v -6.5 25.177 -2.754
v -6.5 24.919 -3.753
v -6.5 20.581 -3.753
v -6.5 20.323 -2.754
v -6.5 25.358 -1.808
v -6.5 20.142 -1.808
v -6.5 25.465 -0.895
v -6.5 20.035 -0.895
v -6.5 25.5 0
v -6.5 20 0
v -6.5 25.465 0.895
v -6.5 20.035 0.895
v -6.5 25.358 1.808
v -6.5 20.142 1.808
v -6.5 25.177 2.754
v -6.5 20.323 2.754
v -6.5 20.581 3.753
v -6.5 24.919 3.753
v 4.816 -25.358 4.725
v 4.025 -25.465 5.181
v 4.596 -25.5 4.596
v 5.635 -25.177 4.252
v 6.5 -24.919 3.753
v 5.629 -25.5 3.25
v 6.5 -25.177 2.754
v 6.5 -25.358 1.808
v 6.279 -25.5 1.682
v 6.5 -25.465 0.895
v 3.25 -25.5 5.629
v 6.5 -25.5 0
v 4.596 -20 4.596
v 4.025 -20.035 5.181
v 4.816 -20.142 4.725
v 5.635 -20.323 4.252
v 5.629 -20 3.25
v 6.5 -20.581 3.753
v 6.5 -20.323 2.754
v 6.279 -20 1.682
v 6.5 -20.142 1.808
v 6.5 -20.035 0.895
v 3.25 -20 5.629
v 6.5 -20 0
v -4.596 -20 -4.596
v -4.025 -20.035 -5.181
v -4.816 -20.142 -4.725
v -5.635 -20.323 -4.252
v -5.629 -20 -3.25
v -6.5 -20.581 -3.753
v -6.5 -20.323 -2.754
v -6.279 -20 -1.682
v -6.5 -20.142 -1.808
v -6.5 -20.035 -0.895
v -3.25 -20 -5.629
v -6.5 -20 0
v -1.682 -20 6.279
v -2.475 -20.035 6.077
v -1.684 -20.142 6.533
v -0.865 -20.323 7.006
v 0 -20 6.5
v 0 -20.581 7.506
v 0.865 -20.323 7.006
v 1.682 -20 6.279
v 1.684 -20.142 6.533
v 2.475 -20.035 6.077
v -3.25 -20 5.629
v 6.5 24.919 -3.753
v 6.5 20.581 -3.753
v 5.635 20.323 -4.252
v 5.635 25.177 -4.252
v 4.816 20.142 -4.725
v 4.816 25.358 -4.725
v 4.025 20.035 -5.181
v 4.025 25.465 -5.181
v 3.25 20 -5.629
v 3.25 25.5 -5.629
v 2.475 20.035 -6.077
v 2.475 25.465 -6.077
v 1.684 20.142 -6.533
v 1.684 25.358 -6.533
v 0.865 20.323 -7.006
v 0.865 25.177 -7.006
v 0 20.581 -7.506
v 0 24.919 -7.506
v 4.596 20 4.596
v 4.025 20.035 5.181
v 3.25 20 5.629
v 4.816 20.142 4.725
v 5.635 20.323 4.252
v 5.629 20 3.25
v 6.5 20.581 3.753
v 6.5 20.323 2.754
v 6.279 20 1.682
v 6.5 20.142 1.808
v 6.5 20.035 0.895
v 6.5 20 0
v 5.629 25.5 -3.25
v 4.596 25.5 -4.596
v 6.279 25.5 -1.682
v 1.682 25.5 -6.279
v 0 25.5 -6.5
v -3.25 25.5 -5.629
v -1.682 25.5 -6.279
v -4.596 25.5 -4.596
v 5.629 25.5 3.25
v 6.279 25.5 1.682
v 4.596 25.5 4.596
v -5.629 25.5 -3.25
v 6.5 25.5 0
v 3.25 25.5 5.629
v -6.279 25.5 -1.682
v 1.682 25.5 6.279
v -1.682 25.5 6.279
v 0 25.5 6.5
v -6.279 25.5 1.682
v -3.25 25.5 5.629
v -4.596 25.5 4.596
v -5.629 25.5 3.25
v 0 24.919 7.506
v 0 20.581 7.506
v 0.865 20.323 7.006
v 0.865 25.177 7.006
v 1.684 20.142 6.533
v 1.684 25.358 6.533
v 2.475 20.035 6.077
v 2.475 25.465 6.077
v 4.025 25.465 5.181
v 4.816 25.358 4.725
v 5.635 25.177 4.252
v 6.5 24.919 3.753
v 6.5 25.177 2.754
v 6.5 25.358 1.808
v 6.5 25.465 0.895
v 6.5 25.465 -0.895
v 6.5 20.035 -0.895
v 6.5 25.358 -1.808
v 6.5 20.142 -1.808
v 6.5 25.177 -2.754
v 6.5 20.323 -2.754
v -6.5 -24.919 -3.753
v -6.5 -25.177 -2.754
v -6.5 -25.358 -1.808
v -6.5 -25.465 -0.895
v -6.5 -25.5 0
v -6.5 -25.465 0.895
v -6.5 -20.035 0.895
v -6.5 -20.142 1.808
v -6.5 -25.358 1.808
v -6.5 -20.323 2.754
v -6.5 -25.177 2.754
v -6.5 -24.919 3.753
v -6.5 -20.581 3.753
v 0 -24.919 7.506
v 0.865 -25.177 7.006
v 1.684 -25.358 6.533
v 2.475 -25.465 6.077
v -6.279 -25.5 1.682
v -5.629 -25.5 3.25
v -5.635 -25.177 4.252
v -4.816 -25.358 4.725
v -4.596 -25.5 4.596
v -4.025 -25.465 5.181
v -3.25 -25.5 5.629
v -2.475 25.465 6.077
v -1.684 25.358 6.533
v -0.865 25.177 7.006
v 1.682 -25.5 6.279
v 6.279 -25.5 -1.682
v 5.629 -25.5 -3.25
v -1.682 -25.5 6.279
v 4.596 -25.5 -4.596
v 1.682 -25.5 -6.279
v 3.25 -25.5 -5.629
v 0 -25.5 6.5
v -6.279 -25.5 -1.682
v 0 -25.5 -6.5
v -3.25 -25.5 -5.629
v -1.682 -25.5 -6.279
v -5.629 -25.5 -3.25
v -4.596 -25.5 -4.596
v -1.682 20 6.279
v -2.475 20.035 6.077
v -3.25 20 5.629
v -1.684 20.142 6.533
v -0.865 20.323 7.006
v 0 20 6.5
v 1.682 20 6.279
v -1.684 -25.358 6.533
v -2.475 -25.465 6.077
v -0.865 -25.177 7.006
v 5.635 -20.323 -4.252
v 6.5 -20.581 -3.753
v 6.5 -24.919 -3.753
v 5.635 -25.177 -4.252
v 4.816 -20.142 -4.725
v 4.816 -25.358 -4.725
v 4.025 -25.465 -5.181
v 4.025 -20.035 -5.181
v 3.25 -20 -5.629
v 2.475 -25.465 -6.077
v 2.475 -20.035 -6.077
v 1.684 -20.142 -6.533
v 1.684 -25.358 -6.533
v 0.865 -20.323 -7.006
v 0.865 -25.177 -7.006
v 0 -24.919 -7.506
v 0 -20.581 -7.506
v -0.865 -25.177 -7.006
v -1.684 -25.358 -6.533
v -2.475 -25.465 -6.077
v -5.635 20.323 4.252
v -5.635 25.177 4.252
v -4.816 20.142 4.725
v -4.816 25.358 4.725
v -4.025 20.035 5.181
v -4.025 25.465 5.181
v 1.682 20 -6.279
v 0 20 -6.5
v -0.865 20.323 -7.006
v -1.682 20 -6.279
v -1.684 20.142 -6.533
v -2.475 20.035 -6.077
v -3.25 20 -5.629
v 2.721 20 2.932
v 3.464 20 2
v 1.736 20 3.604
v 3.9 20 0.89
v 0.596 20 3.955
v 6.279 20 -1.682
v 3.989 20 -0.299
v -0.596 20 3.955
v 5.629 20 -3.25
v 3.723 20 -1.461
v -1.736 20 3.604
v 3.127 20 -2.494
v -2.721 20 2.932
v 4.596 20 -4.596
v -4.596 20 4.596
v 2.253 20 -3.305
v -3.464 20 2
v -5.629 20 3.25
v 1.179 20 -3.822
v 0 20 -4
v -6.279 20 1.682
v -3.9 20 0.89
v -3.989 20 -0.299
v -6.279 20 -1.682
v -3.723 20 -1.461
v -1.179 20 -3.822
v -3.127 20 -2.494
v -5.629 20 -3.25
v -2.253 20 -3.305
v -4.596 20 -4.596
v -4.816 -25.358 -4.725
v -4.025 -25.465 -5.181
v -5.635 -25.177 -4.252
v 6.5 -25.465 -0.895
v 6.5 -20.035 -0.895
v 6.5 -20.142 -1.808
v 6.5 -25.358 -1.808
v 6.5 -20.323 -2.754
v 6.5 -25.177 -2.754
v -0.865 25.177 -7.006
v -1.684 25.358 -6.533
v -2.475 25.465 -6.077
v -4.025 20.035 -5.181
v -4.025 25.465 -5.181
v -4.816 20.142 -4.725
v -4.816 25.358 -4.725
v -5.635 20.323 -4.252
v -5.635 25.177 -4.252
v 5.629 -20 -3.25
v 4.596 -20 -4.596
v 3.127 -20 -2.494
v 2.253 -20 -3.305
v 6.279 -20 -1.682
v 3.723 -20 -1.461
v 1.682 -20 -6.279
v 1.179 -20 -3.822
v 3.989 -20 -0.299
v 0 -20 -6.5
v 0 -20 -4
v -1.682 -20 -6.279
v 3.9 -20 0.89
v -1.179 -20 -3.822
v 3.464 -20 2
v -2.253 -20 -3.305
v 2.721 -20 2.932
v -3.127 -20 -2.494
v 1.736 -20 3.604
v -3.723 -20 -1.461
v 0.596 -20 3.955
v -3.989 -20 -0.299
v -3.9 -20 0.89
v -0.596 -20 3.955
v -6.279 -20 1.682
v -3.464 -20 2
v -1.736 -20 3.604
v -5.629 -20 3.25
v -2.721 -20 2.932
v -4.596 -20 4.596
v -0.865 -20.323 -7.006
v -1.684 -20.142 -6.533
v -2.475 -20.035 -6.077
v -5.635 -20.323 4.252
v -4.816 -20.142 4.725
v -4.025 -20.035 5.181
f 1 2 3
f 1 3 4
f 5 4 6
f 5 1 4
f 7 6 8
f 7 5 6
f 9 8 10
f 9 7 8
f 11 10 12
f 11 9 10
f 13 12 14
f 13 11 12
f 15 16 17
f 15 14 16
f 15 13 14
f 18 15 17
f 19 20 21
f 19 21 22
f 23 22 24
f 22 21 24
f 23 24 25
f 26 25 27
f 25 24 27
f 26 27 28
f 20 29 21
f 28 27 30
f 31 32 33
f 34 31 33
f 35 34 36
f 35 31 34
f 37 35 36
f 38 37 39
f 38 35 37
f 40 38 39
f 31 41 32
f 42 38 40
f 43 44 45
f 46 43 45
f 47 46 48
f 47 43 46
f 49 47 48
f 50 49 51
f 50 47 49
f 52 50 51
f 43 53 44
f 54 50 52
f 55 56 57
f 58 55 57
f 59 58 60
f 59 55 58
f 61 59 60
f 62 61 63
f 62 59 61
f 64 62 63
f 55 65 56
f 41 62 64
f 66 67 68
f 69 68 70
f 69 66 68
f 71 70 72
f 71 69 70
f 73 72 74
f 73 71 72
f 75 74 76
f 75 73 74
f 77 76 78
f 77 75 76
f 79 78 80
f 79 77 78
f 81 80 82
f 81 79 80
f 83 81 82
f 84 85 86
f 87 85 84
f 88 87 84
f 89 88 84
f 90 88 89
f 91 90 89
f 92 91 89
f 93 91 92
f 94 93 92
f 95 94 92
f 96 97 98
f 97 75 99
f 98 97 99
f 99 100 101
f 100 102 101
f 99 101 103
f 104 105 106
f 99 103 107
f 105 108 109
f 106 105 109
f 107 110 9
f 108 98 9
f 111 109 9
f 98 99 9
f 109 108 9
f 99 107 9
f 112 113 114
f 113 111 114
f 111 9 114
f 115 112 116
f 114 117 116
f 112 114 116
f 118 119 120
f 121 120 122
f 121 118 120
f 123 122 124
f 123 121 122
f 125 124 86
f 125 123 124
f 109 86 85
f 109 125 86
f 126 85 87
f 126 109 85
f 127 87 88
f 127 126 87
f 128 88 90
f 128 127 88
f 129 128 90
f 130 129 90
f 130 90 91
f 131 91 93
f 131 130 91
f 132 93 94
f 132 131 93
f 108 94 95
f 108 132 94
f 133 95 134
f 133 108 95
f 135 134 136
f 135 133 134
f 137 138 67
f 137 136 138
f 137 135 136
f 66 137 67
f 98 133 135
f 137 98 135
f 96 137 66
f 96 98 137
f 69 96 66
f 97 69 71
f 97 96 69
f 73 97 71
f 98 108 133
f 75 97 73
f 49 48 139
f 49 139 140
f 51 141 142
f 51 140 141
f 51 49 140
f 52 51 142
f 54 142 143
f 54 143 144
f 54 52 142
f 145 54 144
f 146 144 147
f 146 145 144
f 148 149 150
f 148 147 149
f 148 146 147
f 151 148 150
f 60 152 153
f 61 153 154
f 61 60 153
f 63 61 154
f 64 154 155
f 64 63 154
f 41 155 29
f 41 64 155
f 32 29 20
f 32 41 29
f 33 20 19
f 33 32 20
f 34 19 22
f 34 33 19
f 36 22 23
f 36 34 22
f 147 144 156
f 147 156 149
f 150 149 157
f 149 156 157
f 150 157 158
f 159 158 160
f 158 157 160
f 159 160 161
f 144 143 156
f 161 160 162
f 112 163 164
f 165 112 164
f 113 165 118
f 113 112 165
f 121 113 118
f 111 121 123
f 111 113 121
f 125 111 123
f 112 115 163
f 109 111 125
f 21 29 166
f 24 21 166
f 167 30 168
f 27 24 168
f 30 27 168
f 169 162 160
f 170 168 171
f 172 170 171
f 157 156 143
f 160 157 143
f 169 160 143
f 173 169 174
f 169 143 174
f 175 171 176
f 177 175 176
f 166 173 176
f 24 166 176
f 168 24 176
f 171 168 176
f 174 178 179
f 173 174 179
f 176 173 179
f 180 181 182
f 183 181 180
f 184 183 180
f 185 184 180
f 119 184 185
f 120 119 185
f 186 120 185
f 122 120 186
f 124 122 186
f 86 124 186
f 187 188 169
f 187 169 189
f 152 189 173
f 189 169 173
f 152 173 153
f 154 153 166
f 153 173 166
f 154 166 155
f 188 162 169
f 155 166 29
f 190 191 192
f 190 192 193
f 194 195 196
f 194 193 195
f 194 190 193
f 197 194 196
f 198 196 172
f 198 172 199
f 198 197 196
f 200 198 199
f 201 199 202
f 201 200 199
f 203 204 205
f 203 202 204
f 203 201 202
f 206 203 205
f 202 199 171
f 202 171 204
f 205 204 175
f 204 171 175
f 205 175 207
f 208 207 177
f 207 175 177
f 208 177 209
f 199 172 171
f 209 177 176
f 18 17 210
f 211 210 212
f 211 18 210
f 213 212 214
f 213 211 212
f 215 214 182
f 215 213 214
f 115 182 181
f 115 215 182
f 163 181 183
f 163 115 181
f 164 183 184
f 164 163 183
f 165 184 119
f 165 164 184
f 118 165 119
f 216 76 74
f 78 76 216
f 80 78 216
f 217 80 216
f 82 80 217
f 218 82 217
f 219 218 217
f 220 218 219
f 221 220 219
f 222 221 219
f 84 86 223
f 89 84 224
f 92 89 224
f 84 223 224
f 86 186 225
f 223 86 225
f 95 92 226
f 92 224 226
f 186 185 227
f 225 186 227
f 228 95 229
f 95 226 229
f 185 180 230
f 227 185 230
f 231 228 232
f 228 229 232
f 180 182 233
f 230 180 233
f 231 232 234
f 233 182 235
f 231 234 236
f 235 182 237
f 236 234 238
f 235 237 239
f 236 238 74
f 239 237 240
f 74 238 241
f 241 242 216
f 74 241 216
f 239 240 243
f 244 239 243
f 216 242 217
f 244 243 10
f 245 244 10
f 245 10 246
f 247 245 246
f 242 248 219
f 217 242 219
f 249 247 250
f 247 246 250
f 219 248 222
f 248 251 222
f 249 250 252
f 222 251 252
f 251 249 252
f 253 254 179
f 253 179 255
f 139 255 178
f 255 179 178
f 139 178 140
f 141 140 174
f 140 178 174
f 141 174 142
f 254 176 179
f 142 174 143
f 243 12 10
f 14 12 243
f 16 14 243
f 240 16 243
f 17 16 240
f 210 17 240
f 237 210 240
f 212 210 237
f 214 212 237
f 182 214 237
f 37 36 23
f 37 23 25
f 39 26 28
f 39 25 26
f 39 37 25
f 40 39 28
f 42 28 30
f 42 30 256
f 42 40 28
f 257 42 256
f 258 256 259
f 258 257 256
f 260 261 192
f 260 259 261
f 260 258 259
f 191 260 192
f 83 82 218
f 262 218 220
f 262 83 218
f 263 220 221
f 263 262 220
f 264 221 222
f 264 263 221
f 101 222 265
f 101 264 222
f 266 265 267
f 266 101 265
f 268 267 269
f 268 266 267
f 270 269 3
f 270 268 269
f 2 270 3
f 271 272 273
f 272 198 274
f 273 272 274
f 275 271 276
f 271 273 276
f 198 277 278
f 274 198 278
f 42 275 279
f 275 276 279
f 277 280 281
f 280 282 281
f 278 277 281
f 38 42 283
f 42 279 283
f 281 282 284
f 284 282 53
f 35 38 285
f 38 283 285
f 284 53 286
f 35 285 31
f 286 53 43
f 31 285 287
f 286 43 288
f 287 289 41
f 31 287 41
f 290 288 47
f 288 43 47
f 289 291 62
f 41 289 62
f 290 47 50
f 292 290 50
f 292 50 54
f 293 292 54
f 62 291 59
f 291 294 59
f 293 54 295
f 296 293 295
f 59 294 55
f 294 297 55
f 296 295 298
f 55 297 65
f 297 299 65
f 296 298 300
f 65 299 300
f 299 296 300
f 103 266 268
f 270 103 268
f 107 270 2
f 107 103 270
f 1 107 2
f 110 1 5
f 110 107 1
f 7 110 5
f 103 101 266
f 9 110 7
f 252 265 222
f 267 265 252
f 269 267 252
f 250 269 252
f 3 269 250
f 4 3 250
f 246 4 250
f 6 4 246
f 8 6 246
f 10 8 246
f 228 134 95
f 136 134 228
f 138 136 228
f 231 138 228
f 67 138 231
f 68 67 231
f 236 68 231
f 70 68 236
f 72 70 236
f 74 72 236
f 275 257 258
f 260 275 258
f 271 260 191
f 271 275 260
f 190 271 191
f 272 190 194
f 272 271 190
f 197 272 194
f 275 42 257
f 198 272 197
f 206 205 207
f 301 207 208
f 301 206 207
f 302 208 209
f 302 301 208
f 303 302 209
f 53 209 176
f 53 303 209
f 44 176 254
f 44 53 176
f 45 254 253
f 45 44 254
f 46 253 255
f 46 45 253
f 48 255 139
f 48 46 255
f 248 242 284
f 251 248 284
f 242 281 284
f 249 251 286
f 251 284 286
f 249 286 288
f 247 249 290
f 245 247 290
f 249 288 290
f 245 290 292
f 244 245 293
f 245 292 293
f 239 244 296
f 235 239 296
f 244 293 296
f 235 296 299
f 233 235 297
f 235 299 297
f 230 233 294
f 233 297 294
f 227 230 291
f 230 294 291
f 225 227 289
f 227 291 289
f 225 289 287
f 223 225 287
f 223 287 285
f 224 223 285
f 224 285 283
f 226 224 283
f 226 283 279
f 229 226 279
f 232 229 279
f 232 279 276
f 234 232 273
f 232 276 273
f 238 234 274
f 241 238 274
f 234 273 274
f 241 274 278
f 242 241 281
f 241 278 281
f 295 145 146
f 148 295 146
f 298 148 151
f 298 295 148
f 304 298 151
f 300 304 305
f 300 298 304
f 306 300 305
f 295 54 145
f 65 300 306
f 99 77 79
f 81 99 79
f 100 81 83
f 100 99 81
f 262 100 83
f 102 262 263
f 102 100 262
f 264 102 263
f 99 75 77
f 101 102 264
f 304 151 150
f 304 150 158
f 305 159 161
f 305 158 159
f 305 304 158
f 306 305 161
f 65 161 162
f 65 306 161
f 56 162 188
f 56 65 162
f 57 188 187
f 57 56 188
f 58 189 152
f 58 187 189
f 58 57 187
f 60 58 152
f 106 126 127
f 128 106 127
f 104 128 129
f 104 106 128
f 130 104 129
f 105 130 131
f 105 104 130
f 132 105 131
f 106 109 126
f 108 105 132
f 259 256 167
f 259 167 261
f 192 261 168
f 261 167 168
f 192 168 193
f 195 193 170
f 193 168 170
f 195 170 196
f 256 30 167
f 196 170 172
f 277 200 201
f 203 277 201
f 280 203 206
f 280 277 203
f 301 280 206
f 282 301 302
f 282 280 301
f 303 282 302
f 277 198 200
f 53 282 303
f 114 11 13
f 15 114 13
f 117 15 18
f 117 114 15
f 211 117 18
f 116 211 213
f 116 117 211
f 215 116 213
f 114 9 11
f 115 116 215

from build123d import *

# Parameters (mm, degrees)
SKETCH_2_R          = 12.5
CUT_EXTRUDE_1_DEPTH = 53.92447449


with BuildPart() as part:
    # 草图1 → 旋转1 (revolve)
    with BuildSketch(Plane.XY, mode=Mode.PRIVATE) as revolve_1_sk:
        Polygon((0, 25.5), (10, 25.5), (10, 20), (4, 20), (4, -20), (10, -20), (10, -25.5), (0, -25.5), align=None)
    revolve(revolve_1_sk.sketch.rotate(Axis((0, 0, 0), (0, 1, 0)), 90), axis=Axis((0, 0, 0), (0, 1, 0)))

    # 草图2 → 切除-拉伸1 (cut, through all)
    with BuildSketch(Plane(origin=(0, 25.5, 0), x_dir=(1, 0, 0), z_dir=(0, 1, 0))):
        Circle(SKETCH_2_R)
        Polygon((0, 7.505553499), (-6.5, 3.75277675), (-6.5, -3.75277675), (0, -7.505553499), (6.5, -3.75277675), (6.5, 3.75277675), align=None, mode=Mode.SUBTRACT)
    extrude(amount=-CUT_EXTRUDE_1_DEPTH, mode=Mode.SUBTRACT)

    # 草图3 → 切除-旋转1 (revolve, cut)
    with BuildSketch(Plane.XY):
        Polygon((6.5, 25.5), (9, 25.5), (9, 24.056624327), align=None)
        Polygon((9, 21.443375673), (9, 20), (6.5, 20), align=None)
        Polygon((6.5, -20), (9, -20), (9, -21.443375673), align=None)
        Polygon((6.5, -25.5), (9, -25.5), (9, -24.056624327), align=None)
    revolve(axis=Axis((0, 0, 0), (0, 1, 0)), mode=Mode.SUBTRACT)


solid = part.part
